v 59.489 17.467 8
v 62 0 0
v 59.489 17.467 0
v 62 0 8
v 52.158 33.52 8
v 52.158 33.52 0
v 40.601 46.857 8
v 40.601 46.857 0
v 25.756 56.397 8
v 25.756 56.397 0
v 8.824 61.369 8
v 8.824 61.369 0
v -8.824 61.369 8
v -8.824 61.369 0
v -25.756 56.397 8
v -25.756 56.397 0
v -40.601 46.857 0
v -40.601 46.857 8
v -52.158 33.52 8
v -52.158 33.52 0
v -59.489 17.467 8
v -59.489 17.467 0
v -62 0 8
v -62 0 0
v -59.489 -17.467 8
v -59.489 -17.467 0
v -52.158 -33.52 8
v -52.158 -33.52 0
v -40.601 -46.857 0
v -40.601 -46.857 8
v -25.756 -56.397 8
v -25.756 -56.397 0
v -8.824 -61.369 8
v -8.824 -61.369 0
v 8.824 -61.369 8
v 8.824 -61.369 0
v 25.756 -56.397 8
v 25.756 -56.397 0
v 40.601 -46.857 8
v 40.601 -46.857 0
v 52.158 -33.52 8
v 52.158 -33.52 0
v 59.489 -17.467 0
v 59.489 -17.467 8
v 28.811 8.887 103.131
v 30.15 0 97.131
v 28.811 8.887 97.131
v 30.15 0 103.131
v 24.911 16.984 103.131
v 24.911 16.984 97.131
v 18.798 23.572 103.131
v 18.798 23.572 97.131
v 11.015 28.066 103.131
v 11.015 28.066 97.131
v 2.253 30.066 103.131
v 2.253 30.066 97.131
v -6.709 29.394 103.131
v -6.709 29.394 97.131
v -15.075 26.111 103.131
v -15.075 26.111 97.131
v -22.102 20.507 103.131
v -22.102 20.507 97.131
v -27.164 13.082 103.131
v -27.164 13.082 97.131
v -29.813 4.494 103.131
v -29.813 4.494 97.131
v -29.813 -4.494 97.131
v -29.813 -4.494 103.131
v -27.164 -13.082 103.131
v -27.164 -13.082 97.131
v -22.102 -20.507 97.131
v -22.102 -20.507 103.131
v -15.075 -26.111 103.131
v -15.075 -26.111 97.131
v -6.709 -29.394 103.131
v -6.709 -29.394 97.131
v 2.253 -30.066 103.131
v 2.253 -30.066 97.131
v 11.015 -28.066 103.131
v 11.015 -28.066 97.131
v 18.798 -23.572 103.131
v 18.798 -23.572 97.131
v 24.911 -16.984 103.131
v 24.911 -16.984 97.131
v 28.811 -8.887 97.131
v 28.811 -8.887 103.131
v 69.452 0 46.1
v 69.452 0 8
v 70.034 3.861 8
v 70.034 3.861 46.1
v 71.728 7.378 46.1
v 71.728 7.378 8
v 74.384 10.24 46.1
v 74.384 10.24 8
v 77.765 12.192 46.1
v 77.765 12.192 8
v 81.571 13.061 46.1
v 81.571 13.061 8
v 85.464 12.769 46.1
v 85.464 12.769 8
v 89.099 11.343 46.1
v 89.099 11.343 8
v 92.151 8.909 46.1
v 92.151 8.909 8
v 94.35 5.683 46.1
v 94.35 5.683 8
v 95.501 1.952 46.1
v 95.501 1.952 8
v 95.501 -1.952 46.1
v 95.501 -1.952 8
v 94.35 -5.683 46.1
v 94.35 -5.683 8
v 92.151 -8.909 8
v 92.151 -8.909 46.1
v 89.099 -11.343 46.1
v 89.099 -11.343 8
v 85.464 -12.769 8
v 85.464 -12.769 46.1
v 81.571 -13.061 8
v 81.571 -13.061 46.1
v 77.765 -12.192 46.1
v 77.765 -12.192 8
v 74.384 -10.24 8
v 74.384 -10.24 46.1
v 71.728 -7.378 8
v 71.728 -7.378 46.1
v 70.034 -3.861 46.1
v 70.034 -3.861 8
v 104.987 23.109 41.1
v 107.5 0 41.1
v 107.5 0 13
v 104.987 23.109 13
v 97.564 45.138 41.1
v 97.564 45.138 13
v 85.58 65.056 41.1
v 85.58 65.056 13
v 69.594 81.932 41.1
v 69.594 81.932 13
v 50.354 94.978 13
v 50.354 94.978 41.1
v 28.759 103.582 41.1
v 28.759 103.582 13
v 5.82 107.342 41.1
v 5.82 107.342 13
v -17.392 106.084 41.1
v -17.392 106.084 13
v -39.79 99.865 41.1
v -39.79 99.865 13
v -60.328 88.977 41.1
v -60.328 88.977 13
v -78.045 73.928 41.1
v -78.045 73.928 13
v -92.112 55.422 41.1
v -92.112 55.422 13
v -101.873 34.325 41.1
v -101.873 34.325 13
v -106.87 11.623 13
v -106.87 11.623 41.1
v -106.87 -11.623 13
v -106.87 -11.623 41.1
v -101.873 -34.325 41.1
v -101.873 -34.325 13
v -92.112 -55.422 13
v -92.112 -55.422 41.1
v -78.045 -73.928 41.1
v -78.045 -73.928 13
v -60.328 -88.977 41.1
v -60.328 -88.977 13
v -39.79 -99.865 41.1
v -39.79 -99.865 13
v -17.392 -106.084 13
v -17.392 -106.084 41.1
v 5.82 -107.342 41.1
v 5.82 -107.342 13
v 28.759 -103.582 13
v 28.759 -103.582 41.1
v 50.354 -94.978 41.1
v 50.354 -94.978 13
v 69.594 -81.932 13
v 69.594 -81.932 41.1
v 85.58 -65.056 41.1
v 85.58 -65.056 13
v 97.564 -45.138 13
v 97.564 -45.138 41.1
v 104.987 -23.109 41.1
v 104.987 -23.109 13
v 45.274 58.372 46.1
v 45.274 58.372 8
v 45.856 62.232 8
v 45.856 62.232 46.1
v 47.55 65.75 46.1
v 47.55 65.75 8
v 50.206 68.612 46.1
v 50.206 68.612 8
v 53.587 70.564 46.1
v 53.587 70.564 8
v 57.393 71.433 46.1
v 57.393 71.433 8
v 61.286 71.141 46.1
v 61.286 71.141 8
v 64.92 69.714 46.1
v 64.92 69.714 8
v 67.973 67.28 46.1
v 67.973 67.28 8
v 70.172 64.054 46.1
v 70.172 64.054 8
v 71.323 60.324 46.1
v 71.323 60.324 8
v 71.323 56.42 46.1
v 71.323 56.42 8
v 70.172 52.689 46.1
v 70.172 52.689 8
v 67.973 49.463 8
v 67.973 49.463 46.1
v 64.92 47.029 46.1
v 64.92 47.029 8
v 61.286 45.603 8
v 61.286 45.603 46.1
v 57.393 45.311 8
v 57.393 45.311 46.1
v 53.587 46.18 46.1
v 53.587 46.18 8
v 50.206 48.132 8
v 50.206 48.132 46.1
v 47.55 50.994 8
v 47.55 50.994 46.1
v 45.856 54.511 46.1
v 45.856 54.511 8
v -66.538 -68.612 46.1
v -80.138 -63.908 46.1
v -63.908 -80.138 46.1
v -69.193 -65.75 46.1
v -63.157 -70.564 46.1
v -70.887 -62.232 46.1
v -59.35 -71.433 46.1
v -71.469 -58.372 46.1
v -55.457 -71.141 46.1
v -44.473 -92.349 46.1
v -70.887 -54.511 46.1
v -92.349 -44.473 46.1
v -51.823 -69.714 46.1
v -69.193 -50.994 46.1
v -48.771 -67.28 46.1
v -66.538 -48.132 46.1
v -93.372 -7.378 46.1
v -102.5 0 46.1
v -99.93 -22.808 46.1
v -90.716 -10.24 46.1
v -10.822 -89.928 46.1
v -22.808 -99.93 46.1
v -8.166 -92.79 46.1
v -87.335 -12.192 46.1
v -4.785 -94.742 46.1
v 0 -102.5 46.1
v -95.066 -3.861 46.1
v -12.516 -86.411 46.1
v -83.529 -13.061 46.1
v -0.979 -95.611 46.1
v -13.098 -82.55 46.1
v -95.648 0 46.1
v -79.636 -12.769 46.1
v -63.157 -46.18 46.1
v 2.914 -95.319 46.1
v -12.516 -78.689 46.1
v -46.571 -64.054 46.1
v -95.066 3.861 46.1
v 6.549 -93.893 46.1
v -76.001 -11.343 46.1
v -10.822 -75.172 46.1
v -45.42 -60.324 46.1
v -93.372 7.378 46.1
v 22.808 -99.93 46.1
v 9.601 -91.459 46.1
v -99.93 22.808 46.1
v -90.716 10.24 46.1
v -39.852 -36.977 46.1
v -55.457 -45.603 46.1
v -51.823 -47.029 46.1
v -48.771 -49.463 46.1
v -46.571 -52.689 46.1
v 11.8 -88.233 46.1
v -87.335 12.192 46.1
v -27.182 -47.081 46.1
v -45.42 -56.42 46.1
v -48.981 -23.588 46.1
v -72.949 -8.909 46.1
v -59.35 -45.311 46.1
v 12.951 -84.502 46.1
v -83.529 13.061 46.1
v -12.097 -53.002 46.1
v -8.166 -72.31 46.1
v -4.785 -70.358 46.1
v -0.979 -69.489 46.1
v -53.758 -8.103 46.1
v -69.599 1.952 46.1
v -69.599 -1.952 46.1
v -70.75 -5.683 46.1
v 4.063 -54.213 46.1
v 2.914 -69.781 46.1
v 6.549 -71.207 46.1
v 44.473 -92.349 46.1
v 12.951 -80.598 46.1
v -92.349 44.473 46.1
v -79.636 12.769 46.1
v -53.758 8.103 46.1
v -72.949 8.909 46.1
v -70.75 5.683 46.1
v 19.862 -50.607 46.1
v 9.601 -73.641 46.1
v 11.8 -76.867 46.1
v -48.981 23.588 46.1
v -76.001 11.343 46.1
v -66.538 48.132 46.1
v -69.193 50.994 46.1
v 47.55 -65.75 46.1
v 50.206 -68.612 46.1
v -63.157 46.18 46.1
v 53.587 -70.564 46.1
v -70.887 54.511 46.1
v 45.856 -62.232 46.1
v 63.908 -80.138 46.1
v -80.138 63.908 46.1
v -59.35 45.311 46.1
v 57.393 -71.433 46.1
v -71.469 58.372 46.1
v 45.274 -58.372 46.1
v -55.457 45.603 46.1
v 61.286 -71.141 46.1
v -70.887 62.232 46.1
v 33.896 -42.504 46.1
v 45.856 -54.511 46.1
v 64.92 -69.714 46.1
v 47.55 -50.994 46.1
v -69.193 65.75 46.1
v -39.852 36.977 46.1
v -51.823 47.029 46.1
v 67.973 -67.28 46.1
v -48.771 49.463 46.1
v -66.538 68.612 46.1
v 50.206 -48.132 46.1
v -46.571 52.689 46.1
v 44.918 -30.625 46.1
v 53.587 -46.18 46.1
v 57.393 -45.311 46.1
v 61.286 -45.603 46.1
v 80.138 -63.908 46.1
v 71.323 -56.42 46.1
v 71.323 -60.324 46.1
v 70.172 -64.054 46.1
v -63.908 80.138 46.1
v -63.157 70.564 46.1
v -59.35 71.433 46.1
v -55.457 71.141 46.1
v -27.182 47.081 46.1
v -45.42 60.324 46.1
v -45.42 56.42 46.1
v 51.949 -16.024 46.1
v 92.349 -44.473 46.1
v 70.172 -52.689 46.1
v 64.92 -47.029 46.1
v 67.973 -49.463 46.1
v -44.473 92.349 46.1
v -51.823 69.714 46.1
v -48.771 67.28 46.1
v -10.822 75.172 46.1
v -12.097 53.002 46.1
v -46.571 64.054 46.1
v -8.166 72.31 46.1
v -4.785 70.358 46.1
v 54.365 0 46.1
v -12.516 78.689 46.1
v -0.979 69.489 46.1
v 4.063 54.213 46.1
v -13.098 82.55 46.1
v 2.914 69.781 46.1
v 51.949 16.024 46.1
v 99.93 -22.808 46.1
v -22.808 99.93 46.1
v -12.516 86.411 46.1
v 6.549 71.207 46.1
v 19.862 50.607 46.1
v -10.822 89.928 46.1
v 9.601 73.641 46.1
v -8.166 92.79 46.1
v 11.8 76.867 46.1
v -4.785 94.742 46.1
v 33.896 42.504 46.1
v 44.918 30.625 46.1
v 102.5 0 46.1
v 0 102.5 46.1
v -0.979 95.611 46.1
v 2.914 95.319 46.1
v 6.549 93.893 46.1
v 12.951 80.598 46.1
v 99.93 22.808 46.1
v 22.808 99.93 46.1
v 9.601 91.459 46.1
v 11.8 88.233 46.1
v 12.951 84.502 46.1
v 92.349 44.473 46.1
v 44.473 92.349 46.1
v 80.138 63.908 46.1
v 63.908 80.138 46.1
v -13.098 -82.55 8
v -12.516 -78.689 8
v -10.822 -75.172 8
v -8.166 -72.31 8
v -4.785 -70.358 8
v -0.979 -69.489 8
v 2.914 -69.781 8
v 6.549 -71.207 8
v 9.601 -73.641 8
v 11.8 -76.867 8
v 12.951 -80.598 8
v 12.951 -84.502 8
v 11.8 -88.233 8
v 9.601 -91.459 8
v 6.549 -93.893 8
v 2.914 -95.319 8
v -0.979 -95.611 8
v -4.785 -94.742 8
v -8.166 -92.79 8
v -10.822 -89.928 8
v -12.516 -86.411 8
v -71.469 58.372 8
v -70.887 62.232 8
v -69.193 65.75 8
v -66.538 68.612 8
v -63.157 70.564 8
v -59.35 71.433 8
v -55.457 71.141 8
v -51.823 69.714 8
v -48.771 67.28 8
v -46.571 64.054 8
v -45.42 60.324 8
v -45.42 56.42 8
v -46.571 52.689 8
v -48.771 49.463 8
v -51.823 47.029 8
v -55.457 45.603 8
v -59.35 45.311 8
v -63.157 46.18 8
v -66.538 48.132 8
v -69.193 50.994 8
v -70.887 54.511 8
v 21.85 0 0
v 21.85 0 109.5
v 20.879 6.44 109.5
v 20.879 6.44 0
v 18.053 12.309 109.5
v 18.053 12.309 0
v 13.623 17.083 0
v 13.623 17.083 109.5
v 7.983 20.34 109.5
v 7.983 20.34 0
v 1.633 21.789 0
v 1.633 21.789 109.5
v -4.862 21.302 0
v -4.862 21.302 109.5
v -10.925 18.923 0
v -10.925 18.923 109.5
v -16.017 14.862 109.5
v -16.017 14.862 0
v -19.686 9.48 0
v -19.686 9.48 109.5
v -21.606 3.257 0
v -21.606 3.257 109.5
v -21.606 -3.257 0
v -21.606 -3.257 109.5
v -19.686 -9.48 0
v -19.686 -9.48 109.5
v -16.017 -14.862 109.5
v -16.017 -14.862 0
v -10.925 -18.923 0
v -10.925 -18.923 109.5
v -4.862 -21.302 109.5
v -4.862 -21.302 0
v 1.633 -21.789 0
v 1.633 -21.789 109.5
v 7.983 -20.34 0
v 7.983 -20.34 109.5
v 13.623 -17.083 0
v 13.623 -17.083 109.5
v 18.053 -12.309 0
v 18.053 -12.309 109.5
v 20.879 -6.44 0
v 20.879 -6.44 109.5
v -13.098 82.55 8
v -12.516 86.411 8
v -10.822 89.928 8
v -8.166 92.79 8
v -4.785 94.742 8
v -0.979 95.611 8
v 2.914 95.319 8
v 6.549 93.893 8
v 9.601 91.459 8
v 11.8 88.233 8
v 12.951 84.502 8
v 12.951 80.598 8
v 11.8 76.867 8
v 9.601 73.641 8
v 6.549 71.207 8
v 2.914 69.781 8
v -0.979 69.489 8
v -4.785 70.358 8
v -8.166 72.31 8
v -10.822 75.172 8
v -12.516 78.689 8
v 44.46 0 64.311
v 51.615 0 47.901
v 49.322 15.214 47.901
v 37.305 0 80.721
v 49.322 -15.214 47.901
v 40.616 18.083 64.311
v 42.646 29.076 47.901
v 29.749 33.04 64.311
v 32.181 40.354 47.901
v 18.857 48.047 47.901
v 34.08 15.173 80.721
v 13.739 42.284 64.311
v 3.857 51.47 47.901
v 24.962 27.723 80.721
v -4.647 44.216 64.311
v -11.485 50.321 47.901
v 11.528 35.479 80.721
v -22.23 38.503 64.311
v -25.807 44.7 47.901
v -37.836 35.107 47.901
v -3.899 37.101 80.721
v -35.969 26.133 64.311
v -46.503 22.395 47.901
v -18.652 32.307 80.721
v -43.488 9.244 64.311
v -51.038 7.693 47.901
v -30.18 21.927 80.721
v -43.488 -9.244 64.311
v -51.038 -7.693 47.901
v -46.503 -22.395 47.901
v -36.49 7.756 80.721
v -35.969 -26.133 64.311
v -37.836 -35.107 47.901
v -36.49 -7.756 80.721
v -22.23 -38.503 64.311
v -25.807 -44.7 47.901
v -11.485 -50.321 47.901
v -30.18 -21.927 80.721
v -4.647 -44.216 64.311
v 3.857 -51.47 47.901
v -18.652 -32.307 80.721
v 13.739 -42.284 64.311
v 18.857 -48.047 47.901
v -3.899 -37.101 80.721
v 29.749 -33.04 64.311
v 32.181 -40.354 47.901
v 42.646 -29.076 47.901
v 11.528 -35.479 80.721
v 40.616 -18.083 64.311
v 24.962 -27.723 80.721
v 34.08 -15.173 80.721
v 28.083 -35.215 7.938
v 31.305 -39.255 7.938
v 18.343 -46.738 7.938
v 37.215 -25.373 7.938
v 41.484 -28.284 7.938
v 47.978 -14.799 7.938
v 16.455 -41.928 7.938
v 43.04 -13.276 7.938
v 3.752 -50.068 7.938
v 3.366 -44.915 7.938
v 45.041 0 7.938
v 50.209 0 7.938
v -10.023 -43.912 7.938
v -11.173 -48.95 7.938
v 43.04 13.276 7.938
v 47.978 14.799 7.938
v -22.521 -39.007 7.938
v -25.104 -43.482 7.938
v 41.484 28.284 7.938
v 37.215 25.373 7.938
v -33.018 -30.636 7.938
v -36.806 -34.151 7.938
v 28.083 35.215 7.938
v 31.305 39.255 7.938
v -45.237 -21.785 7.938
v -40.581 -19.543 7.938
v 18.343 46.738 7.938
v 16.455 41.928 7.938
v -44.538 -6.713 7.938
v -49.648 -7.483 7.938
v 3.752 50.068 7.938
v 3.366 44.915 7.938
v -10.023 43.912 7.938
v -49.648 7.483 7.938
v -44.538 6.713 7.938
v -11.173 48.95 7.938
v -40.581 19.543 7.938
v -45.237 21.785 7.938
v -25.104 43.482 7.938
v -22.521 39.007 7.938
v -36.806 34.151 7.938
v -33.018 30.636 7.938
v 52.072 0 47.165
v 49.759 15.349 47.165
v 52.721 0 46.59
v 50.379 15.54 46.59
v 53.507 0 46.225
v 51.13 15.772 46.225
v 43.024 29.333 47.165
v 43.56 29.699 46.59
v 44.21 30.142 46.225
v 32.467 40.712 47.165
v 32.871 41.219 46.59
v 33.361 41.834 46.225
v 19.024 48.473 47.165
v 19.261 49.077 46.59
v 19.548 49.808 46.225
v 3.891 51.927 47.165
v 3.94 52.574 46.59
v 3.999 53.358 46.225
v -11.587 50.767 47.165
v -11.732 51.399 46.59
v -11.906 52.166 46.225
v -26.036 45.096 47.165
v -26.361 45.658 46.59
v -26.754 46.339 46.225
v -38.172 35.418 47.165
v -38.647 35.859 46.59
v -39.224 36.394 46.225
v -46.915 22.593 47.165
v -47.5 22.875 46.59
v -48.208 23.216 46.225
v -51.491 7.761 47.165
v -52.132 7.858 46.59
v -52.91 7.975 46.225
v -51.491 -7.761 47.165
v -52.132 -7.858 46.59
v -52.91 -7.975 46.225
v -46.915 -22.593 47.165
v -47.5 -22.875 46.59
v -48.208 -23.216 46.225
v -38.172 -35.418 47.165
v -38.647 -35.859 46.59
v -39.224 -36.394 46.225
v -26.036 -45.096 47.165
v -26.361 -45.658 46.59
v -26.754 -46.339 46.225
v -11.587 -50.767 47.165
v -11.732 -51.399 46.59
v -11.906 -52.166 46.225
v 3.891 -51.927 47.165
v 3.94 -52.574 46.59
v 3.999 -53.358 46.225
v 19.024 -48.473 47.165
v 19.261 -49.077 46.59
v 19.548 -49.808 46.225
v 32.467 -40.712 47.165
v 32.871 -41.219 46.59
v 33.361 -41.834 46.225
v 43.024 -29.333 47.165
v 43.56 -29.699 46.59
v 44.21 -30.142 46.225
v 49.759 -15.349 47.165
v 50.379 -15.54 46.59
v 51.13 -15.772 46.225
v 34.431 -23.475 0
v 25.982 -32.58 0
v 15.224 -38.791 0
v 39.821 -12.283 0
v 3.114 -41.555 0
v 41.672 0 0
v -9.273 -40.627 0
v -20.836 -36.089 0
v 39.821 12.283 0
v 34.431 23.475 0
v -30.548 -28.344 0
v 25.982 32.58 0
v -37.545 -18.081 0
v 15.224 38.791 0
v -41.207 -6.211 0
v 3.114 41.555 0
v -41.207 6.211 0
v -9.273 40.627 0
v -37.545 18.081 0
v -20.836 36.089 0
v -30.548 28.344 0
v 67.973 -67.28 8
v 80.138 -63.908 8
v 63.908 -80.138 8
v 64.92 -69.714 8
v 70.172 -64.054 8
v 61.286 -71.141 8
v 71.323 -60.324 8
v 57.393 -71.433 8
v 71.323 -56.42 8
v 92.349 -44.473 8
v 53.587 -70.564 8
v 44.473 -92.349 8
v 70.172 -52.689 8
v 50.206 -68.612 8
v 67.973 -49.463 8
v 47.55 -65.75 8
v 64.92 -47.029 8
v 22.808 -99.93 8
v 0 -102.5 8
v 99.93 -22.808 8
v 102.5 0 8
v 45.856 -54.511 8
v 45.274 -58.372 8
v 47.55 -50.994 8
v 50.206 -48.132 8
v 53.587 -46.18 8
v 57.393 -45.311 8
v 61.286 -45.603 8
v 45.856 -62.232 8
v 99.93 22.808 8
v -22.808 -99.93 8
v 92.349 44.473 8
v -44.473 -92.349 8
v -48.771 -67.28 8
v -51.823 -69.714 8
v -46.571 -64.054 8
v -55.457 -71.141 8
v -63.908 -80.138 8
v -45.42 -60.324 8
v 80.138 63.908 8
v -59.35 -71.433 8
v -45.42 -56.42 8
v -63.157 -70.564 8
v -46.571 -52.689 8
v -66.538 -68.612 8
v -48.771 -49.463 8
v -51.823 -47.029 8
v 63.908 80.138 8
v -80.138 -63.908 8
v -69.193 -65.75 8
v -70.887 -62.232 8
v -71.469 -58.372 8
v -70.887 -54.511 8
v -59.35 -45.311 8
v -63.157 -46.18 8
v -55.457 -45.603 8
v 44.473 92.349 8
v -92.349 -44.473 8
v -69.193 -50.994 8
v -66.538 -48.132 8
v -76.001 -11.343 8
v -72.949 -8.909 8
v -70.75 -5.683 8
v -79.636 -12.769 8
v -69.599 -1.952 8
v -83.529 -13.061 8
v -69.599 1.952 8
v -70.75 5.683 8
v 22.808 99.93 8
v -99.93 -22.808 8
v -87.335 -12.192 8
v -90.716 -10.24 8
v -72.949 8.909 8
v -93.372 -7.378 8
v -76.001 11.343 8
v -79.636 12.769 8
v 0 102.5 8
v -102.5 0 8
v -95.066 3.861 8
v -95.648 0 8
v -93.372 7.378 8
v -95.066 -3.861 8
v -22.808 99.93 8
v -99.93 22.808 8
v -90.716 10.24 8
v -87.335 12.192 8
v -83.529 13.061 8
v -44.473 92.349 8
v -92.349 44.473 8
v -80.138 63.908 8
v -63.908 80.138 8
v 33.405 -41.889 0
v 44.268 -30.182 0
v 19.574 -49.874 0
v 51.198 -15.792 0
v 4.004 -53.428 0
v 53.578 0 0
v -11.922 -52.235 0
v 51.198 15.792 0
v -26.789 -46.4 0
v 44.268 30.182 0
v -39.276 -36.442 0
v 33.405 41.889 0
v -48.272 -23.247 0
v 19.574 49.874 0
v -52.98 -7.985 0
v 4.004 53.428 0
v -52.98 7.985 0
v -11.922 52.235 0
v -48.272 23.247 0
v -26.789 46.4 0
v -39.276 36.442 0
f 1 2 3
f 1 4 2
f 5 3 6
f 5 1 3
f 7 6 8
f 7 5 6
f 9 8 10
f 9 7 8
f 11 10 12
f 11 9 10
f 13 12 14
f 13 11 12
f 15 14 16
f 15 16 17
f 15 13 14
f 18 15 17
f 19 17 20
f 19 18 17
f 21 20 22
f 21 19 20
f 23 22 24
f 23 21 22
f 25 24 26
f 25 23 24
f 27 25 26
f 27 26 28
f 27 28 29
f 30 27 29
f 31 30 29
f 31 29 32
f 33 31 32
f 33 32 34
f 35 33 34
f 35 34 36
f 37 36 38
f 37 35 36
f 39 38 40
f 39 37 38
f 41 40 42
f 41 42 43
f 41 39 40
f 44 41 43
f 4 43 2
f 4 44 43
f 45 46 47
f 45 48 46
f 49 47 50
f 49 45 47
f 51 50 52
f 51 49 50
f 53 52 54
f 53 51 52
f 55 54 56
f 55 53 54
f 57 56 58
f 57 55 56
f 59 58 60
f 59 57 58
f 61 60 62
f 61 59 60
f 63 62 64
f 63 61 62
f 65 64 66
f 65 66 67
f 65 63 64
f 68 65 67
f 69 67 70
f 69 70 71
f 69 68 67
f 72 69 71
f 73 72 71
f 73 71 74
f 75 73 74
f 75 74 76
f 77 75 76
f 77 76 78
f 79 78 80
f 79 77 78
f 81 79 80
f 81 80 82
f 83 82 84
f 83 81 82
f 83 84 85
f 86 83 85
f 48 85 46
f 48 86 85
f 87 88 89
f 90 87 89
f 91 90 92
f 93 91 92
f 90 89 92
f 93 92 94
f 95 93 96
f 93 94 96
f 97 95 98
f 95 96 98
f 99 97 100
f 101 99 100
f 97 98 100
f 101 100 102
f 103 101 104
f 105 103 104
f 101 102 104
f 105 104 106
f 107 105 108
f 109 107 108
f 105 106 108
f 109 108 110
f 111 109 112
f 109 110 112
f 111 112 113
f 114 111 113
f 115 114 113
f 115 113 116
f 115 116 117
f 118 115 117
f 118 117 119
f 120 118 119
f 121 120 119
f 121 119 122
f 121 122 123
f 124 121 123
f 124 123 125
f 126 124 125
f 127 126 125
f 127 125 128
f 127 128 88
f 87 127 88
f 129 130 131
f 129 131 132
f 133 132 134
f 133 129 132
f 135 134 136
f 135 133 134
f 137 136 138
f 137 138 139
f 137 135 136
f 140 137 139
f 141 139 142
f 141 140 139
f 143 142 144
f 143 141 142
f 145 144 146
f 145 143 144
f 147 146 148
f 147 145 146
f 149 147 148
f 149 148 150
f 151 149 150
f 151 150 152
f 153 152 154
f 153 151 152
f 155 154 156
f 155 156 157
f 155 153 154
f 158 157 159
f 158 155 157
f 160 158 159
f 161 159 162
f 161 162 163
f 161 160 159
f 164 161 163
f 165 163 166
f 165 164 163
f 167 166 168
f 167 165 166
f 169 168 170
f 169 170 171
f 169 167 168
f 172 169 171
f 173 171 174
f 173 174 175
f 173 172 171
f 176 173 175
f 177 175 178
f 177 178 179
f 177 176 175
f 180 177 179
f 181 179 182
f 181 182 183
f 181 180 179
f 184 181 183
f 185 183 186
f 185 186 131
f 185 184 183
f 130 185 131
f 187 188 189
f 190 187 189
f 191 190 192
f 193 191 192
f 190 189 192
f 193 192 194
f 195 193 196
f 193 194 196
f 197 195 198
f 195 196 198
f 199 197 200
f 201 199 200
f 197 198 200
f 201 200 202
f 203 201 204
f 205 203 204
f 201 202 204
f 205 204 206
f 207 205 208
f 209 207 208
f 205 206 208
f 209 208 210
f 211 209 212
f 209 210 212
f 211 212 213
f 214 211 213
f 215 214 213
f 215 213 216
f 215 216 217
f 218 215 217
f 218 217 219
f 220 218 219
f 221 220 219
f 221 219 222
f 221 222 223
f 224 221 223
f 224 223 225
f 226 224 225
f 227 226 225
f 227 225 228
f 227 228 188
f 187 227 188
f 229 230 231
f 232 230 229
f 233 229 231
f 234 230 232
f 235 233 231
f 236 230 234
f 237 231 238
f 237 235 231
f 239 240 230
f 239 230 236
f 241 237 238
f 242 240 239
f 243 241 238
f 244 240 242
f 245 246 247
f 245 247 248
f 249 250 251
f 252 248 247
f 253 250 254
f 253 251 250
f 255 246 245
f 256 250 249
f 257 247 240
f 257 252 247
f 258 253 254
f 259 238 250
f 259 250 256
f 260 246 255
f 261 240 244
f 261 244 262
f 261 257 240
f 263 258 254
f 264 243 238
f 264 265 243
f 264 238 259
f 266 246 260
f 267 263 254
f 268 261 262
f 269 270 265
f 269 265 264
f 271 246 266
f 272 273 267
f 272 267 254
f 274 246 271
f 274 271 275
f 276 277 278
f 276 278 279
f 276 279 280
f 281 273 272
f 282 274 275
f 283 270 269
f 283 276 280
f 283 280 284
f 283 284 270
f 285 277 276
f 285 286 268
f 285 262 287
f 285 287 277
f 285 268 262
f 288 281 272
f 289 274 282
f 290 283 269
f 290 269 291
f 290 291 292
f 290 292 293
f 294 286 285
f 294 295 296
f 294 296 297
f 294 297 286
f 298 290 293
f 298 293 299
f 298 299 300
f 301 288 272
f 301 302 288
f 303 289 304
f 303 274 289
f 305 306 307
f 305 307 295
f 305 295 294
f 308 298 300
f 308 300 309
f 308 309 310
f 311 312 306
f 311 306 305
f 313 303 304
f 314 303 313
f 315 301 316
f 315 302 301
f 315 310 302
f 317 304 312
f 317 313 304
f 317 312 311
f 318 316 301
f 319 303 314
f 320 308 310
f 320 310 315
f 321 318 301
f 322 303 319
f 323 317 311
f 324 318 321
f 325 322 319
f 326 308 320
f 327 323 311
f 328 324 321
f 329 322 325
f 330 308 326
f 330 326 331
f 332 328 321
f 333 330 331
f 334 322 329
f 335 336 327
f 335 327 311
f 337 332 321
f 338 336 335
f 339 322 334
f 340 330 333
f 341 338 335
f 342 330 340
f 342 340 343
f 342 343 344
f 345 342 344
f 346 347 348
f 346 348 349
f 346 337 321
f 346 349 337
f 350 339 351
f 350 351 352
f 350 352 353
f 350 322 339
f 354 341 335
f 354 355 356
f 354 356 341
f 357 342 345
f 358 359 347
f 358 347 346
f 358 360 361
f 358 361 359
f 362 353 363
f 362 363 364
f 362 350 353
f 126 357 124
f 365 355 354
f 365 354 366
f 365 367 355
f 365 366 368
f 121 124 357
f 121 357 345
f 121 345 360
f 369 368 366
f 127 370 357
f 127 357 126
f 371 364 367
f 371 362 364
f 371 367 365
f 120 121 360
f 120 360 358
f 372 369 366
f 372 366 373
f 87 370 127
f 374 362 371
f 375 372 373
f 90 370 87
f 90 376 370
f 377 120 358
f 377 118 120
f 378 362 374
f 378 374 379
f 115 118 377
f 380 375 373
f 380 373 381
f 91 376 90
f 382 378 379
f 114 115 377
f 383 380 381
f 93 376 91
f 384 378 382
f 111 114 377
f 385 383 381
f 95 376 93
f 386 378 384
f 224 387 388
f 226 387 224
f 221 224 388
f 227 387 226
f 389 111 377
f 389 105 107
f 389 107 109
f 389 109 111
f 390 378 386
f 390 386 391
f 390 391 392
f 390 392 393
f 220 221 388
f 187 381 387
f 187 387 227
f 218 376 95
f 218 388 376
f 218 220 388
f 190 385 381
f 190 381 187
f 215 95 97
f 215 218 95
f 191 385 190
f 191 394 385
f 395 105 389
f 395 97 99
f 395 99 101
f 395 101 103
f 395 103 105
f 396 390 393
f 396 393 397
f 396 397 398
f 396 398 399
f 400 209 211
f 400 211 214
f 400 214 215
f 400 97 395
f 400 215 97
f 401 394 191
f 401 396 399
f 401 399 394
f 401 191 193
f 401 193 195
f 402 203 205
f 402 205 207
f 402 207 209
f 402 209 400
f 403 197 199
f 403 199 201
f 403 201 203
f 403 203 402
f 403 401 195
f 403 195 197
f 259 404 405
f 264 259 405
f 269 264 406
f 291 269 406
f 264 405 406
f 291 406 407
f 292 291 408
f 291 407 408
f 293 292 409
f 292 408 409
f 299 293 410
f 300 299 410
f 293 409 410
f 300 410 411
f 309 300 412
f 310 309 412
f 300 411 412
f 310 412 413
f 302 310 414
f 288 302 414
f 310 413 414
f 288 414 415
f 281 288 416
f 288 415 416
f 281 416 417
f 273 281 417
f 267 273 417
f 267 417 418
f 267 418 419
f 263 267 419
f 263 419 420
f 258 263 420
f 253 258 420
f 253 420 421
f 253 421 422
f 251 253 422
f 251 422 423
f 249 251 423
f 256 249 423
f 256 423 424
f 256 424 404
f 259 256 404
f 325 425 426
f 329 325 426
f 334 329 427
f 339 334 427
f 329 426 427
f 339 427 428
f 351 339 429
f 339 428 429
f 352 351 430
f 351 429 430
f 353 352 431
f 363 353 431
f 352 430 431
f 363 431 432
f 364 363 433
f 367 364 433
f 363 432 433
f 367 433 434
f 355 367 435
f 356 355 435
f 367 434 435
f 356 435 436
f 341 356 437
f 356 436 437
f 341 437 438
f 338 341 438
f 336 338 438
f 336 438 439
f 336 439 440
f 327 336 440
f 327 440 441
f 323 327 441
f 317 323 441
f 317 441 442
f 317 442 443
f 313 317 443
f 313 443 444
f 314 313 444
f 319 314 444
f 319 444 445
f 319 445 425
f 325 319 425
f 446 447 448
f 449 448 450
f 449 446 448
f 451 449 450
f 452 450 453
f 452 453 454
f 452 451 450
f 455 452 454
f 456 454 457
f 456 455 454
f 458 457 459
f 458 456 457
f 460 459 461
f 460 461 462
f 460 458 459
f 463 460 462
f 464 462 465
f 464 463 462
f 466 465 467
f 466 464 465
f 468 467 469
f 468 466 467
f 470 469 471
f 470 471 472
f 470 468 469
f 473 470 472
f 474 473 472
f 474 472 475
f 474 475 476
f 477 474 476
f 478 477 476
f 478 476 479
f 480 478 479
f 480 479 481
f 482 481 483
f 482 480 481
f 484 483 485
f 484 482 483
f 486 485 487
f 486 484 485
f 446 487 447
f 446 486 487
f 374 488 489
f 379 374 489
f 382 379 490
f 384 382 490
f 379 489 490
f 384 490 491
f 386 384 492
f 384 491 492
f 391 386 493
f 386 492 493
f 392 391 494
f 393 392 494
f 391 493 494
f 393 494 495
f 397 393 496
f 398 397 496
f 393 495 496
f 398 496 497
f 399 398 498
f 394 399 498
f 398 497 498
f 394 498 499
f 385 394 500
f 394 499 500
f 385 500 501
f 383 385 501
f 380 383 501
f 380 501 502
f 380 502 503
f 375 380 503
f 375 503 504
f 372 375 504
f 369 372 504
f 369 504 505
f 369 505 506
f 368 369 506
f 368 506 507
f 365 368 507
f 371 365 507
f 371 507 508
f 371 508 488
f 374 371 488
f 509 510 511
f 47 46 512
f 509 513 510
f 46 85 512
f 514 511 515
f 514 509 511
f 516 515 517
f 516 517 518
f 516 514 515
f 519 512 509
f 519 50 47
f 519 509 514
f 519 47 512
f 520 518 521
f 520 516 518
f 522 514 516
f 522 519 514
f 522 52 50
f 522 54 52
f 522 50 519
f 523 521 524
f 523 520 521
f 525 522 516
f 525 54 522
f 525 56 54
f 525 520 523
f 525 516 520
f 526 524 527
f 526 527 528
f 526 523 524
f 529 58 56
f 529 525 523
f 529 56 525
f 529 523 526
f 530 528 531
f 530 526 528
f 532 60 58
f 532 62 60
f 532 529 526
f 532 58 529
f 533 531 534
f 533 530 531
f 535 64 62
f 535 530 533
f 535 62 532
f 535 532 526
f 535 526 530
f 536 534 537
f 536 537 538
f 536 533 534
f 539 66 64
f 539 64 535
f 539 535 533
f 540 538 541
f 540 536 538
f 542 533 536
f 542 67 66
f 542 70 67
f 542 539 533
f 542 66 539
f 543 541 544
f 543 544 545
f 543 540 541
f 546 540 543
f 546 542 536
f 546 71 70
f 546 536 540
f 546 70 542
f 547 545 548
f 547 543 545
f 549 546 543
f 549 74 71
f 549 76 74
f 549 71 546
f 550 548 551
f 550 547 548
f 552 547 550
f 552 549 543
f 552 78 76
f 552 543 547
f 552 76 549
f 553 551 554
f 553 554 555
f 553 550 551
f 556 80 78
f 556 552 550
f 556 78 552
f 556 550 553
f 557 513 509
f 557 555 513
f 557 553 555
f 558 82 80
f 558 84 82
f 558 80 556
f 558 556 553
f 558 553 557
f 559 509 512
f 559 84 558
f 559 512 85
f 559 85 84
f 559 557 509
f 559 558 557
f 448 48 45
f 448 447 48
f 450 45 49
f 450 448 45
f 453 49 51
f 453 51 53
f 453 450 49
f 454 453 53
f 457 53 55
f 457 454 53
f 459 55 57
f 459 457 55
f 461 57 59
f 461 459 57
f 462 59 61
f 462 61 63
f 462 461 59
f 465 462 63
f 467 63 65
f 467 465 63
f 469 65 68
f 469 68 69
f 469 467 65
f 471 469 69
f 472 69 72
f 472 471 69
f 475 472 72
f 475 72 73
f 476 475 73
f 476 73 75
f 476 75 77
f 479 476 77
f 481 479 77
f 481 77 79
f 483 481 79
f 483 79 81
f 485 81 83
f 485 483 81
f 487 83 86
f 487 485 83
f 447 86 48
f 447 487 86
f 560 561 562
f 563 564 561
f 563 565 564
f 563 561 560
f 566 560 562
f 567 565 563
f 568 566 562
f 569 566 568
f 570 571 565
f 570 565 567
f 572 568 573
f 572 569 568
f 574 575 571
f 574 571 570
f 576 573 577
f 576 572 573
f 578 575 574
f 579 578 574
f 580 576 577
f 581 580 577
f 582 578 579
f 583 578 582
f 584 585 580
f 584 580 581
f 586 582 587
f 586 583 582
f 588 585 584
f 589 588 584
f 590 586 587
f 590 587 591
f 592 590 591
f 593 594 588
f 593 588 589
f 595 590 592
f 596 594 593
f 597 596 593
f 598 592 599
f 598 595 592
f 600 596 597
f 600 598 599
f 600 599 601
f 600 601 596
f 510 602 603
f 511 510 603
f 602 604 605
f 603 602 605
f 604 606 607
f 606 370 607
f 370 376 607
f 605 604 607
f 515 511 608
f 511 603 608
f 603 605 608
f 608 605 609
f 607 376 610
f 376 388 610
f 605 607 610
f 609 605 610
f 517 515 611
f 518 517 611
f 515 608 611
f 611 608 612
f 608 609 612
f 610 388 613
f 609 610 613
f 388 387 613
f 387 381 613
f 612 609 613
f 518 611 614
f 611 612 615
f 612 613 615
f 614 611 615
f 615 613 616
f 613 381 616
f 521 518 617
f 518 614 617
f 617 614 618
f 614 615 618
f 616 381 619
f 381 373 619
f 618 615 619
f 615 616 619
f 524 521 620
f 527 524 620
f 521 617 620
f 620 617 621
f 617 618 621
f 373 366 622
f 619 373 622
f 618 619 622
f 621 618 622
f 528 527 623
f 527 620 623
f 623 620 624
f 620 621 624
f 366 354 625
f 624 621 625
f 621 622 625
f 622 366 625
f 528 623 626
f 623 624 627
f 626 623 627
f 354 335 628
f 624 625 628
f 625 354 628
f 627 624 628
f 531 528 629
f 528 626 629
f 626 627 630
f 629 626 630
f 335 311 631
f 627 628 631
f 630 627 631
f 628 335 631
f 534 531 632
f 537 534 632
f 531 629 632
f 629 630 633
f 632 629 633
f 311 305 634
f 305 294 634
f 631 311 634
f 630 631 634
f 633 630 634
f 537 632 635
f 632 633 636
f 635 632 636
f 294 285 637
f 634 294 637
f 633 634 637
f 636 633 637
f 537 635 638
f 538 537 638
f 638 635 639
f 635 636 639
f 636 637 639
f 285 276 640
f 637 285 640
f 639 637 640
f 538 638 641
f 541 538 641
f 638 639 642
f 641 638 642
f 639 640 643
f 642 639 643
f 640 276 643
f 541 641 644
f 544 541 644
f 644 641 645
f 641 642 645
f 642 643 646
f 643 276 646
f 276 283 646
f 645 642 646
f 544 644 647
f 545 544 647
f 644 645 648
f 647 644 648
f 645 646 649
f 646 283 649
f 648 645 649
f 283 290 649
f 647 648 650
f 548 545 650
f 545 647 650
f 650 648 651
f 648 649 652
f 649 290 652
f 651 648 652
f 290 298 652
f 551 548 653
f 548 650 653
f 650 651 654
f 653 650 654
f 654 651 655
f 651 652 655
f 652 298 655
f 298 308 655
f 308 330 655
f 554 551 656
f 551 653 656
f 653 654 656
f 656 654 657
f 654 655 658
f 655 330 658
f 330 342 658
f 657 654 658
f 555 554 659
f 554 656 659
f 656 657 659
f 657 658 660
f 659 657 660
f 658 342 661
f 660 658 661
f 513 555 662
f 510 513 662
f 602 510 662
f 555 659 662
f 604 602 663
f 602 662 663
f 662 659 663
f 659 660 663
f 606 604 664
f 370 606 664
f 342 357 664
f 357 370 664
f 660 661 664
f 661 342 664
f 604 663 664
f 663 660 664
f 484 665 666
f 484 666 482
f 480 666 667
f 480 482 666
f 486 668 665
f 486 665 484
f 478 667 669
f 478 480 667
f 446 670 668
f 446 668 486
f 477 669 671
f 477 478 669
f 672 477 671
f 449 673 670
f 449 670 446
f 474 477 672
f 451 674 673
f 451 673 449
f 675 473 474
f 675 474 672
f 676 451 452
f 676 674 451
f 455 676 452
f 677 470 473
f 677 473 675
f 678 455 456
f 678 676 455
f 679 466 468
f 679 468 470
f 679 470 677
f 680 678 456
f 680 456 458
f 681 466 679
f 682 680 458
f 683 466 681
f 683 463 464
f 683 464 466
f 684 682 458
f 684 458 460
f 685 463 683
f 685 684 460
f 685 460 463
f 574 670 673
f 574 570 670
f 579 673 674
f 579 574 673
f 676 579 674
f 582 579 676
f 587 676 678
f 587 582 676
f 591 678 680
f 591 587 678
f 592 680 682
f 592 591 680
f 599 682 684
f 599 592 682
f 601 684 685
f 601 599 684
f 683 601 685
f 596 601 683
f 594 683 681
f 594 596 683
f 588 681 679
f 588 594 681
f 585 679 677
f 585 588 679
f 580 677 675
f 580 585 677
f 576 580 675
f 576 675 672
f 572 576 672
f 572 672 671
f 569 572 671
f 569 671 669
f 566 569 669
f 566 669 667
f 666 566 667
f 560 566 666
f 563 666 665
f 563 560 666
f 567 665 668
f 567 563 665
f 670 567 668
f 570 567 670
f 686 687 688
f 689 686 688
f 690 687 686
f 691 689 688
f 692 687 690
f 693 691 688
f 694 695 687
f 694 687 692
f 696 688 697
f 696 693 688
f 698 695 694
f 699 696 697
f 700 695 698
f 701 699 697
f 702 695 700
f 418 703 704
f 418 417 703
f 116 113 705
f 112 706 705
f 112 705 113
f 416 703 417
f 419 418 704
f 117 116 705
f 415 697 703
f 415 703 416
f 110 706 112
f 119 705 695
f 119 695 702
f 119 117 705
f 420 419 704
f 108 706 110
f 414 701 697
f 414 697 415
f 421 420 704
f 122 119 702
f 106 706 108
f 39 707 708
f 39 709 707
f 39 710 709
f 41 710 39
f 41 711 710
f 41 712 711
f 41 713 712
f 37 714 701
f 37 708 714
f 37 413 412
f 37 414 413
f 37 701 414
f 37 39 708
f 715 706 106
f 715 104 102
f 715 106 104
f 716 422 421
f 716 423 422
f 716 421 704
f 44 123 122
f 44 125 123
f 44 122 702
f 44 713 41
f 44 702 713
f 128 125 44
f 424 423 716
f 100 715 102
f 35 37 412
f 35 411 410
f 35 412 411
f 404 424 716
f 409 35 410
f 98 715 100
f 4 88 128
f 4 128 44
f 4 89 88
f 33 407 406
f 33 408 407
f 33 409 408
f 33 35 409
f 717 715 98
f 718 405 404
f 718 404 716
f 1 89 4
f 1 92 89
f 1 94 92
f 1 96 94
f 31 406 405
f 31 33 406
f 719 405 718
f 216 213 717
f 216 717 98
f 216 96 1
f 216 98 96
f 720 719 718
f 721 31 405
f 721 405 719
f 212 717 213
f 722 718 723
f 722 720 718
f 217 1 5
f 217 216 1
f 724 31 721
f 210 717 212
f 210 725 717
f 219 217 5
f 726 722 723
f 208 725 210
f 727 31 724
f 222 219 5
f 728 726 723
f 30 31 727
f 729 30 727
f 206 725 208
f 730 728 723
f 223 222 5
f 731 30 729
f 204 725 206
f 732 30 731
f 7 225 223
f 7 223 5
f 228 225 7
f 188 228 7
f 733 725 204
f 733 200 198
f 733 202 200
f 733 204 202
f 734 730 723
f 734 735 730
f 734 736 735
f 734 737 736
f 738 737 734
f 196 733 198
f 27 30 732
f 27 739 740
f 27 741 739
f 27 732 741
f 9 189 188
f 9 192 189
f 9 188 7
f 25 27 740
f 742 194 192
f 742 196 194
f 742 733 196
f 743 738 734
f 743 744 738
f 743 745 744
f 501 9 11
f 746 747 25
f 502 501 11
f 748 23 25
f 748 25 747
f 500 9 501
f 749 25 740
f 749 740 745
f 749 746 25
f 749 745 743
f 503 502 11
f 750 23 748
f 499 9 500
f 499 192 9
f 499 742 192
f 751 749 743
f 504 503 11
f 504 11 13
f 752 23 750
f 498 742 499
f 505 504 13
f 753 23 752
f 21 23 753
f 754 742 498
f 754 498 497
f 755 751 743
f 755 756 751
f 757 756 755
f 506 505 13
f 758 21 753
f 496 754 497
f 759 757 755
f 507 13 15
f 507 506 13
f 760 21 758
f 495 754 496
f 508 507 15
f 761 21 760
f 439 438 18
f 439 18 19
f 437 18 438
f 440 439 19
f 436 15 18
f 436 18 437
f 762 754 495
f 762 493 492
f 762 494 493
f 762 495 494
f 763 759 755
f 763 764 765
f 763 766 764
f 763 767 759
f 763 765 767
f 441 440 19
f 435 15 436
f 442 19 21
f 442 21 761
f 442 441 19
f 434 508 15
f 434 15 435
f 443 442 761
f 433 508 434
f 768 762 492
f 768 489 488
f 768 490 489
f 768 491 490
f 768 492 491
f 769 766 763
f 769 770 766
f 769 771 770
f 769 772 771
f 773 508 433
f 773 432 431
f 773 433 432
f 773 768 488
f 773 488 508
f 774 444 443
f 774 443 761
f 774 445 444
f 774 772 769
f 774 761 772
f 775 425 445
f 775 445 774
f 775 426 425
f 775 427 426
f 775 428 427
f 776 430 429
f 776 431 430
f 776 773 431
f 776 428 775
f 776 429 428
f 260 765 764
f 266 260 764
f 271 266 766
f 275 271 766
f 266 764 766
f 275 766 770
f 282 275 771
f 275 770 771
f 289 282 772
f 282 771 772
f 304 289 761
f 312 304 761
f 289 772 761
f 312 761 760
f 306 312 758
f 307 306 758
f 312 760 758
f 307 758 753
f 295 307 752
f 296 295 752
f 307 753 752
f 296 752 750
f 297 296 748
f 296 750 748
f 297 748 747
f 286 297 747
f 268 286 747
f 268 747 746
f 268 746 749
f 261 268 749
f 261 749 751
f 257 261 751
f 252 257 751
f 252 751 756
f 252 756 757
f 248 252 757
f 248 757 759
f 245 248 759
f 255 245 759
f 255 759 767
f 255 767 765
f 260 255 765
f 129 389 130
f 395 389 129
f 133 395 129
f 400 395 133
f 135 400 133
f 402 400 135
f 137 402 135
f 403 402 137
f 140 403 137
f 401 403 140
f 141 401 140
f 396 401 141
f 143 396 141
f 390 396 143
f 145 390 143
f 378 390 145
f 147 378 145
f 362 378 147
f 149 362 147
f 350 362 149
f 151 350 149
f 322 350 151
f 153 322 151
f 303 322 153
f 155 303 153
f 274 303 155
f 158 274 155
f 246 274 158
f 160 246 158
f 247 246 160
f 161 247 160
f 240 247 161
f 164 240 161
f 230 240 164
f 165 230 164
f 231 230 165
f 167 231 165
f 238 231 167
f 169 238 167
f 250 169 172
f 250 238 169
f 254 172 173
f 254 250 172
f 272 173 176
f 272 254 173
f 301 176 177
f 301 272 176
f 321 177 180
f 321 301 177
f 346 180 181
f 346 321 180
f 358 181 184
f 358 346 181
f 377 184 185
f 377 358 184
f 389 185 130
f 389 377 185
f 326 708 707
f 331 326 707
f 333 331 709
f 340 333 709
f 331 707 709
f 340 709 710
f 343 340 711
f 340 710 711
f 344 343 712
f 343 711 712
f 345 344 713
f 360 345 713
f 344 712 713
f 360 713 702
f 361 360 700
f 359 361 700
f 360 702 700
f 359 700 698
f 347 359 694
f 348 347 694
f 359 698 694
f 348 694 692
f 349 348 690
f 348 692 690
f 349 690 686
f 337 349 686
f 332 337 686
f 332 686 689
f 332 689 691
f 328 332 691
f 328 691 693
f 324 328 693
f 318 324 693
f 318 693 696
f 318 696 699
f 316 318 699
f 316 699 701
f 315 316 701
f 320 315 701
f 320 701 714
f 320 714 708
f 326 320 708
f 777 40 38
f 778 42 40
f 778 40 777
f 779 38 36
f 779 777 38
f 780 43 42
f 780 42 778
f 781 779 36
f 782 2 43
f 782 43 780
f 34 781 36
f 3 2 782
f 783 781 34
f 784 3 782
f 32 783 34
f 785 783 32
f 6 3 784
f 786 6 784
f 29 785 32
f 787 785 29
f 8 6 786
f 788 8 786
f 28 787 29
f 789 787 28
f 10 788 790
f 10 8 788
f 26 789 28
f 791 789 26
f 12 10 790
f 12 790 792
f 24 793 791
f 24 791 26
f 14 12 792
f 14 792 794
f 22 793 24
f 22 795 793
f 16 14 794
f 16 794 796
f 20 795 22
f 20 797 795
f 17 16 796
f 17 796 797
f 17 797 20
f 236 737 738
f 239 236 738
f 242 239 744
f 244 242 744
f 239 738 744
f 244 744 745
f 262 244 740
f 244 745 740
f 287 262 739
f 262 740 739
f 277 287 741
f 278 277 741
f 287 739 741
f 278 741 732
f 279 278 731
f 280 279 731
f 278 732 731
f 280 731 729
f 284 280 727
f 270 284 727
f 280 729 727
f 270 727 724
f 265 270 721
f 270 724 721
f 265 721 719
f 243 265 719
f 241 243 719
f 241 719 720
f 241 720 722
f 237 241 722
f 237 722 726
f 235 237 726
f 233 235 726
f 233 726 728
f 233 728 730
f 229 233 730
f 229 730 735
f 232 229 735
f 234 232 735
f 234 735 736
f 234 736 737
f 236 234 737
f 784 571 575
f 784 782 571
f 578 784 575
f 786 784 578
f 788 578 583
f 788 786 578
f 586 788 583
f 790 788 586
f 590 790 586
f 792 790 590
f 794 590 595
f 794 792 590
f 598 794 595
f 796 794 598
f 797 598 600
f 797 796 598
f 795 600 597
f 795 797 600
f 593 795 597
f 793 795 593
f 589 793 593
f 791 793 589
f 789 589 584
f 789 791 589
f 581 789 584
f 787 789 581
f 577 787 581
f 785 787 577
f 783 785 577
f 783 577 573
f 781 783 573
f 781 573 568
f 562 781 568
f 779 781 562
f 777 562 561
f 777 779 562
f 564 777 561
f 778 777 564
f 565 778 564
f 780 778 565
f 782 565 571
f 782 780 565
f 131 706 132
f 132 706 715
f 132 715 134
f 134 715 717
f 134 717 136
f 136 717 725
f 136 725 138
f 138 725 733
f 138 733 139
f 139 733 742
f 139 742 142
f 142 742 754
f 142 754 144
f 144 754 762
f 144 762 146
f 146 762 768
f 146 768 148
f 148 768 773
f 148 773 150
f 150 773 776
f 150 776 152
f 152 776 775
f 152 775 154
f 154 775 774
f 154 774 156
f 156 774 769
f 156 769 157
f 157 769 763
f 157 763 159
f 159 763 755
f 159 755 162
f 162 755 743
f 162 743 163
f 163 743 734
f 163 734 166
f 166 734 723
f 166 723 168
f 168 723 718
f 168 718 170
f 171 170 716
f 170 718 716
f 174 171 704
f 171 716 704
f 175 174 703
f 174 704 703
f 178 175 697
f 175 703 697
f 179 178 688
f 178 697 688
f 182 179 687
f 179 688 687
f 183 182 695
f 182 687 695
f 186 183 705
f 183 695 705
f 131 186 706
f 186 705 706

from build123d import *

# Parameters (mm, degrees)
F3_D    = 26.19502
F4_R    = 3
F5_SIZE = 5
F6_SIZE = 5


with BuildPart() as f1:
    # F0 (on Front) → F1 (revolve)
    with BuildSketch(Plane.XZ):
        Polygon((21.85, 109.5), (21.85, 0), (41.672, 0), (45.0412688537, 7.9375), (50.2088311463, 7.9375), (53.5781, 0), (62.0001, 0), (62.0001, 8), (107.5, 8), (107.5, 46.1), (52.4, 46.1), (30.15, 97.1311859998), (30.15, 103.1311859998), align=None)
    revolve(axis=Axis((0, 0, 78.9197534323), (0, 0, 1)))

    # F3 (through all)
    with Locations(Plane.XY.offset(46.1)):
        with Locations((0, 82.55), (58.3716647869, 58.3716647869), (82.55, 0), (58.3716647869, -58.3716647869), (0, -82.55), (-58.3716647869, -58.3716647869), (-82.55, 0), (-58.3716647869, 58.3716647869)):
            Hole(F3_D / 2)

    # F4
    f4_edges = [f1.edges().sort_by_distance(p)[0] for p in [
        (-52.4, 0, 46.1),
    ]]
    fillet(f4_edges, radius=F4_R)

    # F5
    f5_edges = [f1.edges().sort_by_distance(p)[0] for p in [
        (-107.5, 0, 8),
    ]]
    chamfer(f5_edges, length=F5_SIZE)

    # F6
    f6_edges = [f1.edges().sort_by_distance(p)[0] for p in [
        (-107.5, 0, 46.1),
    ]]
    chamfer(f6_edges, length=F6_SIZE)


solid = f1.part
